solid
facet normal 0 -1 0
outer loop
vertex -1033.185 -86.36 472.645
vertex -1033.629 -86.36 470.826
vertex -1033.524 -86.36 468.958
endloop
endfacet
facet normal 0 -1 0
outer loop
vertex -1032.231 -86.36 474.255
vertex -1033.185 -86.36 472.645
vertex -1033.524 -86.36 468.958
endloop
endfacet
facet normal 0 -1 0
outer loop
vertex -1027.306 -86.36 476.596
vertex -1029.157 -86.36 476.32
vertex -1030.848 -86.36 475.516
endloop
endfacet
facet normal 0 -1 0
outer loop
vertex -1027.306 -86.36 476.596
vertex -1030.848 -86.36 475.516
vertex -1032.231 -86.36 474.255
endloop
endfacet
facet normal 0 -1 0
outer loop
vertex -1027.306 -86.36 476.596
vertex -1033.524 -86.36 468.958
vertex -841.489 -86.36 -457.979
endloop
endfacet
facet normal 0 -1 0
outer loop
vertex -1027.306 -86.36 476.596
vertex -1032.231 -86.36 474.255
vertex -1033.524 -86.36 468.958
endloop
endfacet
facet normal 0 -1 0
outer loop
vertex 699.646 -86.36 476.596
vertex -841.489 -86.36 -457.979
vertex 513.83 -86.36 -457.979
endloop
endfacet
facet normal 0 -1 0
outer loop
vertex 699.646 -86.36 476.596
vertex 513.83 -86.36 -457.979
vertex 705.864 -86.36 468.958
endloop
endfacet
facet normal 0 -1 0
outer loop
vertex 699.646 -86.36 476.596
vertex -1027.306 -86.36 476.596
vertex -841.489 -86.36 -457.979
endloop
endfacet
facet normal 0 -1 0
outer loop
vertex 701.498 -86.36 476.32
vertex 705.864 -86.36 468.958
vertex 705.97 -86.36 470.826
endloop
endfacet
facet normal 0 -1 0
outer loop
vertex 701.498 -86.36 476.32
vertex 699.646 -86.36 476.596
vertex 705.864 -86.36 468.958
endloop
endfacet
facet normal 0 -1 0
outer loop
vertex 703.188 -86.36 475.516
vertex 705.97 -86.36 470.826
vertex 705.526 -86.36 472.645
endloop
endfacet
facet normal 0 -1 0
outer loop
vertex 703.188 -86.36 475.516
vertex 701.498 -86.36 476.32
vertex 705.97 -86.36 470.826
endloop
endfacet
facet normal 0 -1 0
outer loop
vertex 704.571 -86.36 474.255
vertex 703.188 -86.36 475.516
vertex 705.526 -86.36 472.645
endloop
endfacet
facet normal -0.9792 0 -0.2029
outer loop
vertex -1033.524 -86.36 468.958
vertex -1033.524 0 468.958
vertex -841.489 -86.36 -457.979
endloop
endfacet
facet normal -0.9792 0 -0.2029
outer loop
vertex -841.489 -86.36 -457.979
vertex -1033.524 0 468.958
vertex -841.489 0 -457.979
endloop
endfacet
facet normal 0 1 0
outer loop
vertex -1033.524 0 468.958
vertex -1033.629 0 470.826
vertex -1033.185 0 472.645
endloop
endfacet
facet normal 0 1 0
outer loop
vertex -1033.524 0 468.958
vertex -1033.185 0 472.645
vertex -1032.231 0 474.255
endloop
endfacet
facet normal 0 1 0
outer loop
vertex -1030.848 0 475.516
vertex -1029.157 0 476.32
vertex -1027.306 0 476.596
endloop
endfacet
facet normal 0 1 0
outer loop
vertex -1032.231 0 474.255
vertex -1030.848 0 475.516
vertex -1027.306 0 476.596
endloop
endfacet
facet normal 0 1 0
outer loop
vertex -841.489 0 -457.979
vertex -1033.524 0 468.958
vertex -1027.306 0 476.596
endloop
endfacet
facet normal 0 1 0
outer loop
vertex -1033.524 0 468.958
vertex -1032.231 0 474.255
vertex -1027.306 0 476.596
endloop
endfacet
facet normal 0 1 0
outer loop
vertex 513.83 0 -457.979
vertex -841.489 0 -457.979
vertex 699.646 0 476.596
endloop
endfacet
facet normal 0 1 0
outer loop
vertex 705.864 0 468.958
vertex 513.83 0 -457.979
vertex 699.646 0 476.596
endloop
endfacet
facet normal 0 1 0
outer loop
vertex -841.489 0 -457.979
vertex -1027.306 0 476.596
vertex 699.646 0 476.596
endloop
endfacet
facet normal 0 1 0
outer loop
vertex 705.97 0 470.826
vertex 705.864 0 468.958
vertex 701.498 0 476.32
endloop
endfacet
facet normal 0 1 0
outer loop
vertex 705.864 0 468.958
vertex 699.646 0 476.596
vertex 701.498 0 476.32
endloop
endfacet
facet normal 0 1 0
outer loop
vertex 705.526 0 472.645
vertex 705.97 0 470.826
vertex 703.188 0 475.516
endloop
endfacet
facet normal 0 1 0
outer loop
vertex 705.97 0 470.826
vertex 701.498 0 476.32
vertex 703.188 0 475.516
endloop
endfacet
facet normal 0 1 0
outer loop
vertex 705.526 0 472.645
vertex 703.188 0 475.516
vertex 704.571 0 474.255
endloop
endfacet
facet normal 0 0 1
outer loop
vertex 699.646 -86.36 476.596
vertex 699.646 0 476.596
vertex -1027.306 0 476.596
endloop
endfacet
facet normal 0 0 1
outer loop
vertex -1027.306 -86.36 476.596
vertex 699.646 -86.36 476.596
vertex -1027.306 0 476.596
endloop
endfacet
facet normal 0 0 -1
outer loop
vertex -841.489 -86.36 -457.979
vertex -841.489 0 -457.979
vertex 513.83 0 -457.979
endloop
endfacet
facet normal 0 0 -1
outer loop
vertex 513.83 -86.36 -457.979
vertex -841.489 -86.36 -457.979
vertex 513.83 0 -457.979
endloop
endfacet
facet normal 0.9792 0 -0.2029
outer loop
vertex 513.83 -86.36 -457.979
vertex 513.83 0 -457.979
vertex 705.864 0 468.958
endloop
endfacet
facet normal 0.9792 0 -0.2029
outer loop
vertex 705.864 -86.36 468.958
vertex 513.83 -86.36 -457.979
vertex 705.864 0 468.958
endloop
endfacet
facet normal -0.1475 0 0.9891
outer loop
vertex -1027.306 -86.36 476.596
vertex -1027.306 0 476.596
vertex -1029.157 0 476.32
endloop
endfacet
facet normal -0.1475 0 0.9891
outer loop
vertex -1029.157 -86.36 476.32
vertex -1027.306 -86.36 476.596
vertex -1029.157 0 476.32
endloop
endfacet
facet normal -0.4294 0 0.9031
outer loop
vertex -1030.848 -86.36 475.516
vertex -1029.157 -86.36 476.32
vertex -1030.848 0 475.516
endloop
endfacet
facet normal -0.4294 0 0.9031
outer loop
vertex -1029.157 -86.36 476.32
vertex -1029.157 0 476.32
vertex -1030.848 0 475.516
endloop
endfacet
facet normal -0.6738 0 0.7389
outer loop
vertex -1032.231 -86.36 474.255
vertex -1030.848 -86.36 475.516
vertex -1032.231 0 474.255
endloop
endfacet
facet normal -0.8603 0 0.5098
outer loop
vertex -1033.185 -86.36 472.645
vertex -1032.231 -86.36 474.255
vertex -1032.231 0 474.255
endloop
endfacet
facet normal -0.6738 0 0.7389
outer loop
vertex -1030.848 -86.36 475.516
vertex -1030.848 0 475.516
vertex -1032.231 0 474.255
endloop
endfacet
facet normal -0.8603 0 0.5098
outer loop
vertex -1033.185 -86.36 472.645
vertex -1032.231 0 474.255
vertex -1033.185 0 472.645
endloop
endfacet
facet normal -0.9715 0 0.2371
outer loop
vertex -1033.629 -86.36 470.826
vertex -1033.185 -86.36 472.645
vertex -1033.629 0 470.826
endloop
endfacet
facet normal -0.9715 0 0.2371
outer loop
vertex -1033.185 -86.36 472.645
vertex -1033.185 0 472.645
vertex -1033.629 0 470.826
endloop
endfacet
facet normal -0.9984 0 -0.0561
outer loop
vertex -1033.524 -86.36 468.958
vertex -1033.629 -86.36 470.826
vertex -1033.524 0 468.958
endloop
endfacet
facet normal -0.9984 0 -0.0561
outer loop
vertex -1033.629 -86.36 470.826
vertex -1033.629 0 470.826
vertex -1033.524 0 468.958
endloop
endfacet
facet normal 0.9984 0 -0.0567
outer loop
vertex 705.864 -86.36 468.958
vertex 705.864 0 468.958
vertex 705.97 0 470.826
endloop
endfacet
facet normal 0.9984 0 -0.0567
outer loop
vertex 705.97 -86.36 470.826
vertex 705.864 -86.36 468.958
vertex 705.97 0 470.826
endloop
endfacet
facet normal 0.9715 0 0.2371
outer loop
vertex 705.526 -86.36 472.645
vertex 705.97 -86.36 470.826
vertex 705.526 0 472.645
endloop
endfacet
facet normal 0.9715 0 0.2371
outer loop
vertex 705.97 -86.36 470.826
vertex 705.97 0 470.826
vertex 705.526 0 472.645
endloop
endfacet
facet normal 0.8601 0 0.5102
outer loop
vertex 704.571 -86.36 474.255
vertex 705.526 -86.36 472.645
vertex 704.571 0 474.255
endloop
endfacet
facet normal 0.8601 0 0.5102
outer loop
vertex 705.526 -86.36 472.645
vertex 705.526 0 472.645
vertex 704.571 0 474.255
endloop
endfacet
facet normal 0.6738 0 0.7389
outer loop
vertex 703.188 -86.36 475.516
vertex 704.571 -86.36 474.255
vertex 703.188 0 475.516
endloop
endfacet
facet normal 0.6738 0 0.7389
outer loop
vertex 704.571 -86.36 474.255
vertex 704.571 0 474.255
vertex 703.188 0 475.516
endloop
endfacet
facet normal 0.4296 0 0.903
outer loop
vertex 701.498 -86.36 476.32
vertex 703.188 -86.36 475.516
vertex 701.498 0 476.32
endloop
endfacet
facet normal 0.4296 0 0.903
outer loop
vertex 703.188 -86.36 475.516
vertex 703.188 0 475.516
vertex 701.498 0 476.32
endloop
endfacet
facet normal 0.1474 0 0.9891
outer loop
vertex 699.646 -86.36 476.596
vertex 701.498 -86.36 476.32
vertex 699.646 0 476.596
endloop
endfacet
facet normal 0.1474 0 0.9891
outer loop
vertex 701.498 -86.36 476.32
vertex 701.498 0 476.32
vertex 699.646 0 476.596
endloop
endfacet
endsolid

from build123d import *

# Parameters (mm, degrees)
F1_DEPTH = 86.36


# Not quite as in the source:
# - a feature of the source that left no trace in its solid (it failed there, or was rolled back) is left out


with BuildPart() as f1:
    # F0 (on Front) → F1 (new body)
    with BuildSketch(Plane.XZ):
        with BuildLine():
            Line((699.6463771647, 476.5957295895), (-1027.3060432158, 476.5957295895))
            ThreePointArc((-1027.3060432158, 476.5957295895), (-1032.2305974455, 474.2546278967), (-1033.5240076617, 468.9575455385))
            Line((-1033.5240076617, 468.9575455385), (-841.4893746376, -457.9787254334))
            Line((-841.4893746376, -457.9787254333), (513.829767704, -457.9787254333))
            Line((513.829767704, -457.9787254333), (705.8643416894, 468.9575459187))
            ThreePointArc((705.8643416894, 468.9575459187), (704.5709312719, 474.2546280473), (699.6463771647, 476.5957295895))
        make_face()
    extrude(amount=F1_DEPTH)


solid = f1.part
